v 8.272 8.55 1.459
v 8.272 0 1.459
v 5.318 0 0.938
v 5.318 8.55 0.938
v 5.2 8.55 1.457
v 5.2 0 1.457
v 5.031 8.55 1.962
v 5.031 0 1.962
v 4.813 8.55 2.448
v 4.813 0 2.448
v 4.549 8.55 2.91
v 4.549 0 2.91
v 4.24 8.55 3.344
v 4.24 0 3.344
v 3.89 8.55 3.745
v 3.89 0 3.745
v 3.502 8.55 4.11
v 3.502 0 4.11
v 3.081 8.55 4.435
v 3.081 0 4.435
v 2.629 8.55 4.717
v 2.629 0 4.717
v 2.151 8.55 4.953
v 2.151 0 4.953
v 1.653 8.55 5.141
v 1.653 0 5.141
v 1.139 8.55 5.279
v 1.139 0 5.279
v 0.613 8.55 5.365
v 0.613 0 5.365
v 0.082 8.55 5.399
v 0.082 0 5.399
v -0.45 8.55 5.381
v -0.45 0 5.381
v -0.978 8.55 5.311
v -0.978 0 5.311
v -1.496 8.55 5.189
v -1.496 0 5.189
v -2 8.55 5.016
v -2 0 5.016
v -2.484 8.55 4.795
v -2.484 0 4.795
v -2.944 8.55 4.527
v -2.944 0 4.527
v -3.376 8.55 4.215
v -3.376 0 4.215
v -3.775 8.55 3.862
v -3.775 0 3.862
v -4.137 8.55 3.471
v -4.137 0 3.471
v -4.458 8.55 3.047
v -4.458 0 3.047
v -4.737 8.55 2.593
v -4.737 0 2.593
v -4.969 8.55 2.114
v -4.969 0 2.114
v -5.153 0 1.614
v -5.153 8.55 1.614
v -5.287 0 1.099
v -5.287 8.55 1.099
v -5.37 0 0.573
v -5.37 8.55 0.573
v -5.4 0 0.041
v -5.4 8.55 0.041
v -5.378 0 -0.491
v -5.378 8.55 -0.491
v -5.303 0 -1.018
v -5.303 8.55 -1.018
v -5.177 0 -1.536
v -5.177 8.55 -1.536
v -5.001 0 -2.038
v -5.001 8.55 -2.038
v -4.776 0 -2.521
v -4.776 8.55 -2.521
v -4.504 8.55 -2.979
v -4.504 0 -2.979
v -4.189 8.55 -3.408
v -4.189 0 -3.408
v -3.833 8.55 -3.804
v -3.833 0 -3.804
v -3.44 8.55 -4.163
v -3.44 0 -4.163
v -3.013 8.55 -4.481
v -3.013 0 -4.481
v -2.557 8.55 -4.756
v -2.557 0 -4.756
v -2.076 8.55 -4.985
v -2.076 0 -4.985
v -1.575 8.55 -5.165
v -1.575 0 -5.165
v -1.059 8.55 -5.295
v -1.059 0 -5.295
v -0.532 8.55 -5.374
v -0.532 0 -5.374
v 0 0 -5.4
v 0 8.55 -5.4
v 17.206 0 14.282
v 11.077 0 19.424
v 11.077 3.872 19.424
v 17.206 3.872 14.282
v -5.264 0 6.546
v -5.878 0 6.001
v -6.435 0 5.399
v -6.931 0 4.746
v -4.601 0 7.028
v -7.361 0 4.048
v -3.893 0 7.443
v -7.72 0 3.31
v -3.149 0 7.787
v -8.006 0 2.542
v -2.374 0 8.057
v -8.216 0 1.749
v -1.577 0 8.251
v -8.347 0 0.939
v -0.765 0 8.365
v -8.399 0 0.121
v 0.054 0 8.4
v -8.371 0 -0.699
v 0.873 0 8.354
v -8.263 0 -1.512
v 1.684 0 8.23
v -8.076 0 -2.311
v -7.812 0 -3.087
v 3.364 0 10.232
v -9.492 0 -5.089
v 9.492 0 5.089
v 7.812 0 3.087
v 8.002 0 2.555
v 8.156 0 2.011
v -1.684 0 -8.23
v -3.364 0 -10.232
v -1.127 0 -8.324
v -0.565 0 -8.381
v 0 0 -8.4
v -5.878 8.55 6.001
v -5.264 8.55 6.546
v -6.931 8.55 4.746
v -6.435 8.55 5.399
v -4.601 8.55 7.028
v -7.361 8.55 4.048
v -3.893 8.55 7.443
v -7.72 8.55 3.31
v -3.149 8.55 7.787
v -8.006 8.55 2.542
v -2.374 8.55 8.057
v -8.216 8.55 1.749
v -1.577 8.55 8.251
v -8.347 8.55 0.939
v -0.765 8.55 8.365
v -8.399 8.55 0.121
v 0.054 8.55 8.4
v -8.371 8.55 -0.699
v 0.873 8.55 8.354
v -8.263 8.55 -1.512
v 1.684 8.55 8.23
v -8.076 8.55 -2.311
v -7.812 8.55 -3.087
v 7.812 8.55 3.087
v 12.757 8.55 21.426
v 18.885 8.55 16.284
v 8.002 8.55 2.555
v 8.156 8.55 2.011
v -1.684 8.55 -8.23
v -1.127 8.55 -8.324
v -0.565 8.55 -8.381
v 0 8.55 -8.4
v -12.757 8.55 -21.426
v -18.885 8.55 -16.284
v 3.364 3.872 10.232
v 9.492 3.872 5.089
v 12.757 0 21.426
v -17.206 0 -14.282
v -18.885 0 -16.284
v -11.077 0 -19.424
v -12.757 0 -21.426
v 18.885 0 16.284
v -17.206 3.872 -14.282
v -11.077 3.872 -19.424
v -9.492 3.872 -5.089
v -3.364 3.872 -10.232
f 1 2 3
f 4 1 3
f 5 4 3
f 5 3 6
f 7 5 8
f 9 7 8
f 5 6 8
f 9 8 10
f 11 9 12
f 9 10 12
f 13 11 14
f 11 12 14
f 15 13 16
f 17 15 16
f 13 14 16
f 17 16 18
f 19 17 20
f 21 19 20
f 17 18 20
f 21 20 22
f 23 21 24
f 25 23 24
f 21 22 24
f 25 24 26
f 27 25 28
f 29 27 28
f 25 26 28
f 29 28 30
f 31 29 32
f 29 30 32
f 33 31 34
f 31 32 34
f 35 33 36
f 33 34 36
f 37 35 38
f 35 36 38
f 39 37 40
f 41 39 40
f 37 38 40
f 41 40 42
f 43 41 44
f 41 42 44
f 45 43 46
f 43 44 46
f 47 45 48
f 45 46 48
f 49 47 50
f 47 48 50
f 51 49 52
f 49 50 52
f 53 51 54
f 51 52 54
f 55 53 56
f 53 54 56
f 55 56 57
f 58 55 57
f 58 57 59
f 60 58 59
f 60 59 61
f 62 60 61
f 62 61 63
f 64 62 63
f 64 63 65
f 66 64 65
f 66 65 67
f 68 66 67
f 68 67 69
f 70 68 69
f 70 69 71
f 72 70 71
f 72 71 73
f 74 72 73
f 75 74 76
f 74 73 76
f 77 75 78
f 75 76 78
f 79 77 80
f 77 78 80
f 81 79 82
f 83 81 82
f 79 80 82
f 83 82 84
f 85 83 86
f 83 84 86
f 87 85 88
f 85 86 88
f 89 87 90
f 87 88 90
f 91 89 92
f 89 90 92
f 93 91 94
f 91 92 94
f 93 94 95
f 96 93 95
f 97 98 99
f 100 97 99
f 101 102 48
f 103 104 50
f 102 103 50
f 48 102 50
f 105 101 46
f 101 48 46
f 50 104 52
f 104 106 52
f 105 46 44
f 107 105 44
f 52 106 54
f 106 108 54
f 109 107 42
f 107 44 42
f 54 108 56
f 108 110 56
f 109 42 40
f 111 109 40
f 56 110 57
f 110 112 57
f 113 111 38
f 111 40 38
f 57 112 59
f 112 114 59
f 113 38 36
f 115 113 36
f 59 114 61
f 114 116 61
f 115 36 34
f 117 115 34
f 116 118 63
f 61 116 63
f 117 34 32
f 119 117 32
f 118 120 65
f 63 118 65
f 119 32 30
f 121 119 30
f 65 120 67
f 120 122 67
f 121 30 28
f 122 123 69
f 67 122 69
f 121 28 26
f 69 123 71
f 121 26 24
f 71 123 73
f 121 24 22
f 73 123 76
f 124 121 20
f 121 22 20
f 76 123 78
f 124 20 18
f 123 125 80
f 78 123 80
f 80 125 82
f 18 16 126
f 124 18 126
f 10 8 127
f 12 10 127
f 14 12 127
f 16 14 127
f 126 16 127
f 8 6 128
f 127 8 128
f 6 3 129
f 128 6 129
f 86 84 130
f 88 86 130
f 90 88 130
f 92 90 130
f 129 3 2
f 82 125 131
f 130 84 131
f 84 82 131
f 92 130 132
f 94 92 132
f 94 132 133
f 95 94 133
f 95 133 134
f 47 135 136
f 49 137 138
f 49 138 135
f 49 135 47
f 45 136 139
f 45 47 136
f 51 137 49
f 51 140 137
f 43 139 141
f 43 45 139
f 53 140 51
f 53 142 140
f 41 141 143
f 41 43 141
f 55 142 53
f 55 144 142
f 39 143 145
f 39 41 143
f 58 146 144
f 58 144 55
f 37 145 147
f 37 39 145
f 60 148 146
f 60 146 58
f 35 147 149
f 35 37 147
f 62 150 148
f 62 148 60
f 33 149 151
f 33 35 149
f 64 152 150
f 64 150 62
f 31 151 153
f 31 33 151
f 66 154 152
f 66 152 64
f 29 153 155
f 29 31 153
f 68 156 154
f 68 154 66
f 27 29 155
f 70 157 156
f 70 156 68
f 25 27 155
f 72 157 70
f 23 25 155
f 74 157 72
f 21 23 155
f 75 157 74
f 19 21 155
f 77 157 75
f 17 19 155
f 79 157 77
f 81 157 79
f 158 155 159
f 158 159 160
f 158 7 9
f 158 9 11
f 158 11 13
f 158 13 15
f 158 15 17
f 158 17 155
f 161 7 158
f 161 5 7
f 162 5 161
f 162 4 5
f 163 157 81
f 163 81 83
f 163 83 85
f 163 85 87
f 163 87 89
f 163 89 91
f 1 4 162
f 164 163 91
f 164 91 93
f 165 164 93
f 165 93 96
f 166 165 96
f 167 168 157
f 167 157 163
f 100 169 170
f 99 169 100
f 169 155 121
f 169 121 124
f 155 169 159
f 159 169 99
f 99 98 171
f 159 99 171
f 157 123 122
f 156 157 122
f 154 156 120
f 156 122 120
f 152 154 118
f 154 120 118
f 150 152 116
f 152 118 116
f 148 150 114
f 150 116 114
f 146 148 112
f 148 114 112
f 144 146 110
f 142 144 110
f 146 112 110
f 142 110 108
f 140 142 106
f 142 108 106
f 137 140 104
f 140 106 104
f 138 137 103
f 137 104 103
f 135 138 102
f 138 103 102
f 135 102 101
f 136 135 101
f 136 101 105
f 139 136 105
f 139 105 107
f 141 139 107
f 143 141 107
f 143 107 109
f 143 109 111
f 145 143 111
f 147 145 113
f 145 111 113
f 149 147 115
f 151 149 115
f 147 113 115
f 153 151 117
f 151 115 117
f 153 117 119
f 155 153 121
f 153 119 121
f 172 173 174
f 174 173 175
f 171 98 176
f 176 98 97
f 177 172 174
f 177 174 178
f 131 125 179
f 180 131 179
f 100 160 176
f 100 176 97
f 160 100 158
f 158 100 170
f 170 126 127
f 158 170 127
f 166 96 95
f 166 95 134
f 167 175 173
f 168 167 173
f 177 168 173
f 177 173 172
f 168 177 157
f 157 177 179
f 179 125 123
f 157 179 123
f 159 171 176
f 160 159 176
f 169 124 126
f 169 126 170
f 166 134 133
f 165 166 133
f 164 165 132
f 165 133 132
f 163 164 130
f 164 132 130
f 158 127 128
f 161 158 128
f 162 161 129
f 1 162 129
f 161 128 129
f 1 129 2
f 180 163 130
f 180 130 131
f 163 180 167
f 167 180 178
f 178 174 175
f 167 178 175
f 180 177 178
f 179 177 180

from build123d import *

# Parameters (mm, degrees)
BOSS_EXTRUDE2_DEPTH = 8.55
SKETCH2_W           = 12
SKETCH2_H           = 3.872399236
CUT_EXTRUDE1_DEPTH  = 10


with BuildPart() as part:
    # Sketch1 → Boss-Extrude2 (new body)
    with BuildSketch(Plane(origin=(0, 0, 0), x_dir=(1, 0, 0), z_dir=(0, 1, 0))):
        with BuildLine():
            Line((0, 5.4), (0, 8.4))
            ThreePointArc((0, 8.4), (-0.846182507, 8.357270796), (-1.683756274, 8.229517896))
            Line((-1.683756274, 8.229517896), (-12.757091691, 21.426205161))
            Line((-12.757091691, 21.426205161), (-18.885447236, 16.283904283))
            Line((-18.885447236, 16.283904283), (-7.812111819, 3.087217019))
            ThreePointArc((-7.812111819, 3.087217019), (-6.434773322, -5.399415921), (1.683756274, -8.229517896))
            Line((1.683756274, -8.229517896), (12.757091691, -21.426205161))
            Line((12.757091691, -21.426205161), (18.885447236, -16.283904283))
            Line((18.885447236, -16.283904283), (7.812111819, -3.087217019))
            ThreePointArc((7.812111819, -3.087217019), (8.083367024, -2.284551937), (8.272385125, -1.458644692))
            Line((8.272385125, -1.458644692), (5.317961866, -0.937700159))
            ThreePointArc((5.317961866, -0.937700159), (-4.136639993, -3.471053092), (0, 5.4))
        make_face()
    extrude(amount=BOSS_EXTRUDE2_DEPTH)

    # Sketch2 → Cut-Extrude1 (cut)
    with BuildSketch(Plane(origin=(-3.064177772, 0, 2.571150439), x_dir=(0.64278761, 0, 0.766044443), z_dir=(-0.766044443, 0, 0.64278761))):
        with Locations((-16, 1.936199618)):
            Rectangle(SKETCH2_W, SKETCH2_H)
        with Locations((16, 1.936199618)):
            Rectangle(SKETCH2_W, SKETCH2_H)
    extrude(amount=-CUT_EXTRUDE1_DEPTH, mode=Mode.SUBTRACT)


solid = part.part
